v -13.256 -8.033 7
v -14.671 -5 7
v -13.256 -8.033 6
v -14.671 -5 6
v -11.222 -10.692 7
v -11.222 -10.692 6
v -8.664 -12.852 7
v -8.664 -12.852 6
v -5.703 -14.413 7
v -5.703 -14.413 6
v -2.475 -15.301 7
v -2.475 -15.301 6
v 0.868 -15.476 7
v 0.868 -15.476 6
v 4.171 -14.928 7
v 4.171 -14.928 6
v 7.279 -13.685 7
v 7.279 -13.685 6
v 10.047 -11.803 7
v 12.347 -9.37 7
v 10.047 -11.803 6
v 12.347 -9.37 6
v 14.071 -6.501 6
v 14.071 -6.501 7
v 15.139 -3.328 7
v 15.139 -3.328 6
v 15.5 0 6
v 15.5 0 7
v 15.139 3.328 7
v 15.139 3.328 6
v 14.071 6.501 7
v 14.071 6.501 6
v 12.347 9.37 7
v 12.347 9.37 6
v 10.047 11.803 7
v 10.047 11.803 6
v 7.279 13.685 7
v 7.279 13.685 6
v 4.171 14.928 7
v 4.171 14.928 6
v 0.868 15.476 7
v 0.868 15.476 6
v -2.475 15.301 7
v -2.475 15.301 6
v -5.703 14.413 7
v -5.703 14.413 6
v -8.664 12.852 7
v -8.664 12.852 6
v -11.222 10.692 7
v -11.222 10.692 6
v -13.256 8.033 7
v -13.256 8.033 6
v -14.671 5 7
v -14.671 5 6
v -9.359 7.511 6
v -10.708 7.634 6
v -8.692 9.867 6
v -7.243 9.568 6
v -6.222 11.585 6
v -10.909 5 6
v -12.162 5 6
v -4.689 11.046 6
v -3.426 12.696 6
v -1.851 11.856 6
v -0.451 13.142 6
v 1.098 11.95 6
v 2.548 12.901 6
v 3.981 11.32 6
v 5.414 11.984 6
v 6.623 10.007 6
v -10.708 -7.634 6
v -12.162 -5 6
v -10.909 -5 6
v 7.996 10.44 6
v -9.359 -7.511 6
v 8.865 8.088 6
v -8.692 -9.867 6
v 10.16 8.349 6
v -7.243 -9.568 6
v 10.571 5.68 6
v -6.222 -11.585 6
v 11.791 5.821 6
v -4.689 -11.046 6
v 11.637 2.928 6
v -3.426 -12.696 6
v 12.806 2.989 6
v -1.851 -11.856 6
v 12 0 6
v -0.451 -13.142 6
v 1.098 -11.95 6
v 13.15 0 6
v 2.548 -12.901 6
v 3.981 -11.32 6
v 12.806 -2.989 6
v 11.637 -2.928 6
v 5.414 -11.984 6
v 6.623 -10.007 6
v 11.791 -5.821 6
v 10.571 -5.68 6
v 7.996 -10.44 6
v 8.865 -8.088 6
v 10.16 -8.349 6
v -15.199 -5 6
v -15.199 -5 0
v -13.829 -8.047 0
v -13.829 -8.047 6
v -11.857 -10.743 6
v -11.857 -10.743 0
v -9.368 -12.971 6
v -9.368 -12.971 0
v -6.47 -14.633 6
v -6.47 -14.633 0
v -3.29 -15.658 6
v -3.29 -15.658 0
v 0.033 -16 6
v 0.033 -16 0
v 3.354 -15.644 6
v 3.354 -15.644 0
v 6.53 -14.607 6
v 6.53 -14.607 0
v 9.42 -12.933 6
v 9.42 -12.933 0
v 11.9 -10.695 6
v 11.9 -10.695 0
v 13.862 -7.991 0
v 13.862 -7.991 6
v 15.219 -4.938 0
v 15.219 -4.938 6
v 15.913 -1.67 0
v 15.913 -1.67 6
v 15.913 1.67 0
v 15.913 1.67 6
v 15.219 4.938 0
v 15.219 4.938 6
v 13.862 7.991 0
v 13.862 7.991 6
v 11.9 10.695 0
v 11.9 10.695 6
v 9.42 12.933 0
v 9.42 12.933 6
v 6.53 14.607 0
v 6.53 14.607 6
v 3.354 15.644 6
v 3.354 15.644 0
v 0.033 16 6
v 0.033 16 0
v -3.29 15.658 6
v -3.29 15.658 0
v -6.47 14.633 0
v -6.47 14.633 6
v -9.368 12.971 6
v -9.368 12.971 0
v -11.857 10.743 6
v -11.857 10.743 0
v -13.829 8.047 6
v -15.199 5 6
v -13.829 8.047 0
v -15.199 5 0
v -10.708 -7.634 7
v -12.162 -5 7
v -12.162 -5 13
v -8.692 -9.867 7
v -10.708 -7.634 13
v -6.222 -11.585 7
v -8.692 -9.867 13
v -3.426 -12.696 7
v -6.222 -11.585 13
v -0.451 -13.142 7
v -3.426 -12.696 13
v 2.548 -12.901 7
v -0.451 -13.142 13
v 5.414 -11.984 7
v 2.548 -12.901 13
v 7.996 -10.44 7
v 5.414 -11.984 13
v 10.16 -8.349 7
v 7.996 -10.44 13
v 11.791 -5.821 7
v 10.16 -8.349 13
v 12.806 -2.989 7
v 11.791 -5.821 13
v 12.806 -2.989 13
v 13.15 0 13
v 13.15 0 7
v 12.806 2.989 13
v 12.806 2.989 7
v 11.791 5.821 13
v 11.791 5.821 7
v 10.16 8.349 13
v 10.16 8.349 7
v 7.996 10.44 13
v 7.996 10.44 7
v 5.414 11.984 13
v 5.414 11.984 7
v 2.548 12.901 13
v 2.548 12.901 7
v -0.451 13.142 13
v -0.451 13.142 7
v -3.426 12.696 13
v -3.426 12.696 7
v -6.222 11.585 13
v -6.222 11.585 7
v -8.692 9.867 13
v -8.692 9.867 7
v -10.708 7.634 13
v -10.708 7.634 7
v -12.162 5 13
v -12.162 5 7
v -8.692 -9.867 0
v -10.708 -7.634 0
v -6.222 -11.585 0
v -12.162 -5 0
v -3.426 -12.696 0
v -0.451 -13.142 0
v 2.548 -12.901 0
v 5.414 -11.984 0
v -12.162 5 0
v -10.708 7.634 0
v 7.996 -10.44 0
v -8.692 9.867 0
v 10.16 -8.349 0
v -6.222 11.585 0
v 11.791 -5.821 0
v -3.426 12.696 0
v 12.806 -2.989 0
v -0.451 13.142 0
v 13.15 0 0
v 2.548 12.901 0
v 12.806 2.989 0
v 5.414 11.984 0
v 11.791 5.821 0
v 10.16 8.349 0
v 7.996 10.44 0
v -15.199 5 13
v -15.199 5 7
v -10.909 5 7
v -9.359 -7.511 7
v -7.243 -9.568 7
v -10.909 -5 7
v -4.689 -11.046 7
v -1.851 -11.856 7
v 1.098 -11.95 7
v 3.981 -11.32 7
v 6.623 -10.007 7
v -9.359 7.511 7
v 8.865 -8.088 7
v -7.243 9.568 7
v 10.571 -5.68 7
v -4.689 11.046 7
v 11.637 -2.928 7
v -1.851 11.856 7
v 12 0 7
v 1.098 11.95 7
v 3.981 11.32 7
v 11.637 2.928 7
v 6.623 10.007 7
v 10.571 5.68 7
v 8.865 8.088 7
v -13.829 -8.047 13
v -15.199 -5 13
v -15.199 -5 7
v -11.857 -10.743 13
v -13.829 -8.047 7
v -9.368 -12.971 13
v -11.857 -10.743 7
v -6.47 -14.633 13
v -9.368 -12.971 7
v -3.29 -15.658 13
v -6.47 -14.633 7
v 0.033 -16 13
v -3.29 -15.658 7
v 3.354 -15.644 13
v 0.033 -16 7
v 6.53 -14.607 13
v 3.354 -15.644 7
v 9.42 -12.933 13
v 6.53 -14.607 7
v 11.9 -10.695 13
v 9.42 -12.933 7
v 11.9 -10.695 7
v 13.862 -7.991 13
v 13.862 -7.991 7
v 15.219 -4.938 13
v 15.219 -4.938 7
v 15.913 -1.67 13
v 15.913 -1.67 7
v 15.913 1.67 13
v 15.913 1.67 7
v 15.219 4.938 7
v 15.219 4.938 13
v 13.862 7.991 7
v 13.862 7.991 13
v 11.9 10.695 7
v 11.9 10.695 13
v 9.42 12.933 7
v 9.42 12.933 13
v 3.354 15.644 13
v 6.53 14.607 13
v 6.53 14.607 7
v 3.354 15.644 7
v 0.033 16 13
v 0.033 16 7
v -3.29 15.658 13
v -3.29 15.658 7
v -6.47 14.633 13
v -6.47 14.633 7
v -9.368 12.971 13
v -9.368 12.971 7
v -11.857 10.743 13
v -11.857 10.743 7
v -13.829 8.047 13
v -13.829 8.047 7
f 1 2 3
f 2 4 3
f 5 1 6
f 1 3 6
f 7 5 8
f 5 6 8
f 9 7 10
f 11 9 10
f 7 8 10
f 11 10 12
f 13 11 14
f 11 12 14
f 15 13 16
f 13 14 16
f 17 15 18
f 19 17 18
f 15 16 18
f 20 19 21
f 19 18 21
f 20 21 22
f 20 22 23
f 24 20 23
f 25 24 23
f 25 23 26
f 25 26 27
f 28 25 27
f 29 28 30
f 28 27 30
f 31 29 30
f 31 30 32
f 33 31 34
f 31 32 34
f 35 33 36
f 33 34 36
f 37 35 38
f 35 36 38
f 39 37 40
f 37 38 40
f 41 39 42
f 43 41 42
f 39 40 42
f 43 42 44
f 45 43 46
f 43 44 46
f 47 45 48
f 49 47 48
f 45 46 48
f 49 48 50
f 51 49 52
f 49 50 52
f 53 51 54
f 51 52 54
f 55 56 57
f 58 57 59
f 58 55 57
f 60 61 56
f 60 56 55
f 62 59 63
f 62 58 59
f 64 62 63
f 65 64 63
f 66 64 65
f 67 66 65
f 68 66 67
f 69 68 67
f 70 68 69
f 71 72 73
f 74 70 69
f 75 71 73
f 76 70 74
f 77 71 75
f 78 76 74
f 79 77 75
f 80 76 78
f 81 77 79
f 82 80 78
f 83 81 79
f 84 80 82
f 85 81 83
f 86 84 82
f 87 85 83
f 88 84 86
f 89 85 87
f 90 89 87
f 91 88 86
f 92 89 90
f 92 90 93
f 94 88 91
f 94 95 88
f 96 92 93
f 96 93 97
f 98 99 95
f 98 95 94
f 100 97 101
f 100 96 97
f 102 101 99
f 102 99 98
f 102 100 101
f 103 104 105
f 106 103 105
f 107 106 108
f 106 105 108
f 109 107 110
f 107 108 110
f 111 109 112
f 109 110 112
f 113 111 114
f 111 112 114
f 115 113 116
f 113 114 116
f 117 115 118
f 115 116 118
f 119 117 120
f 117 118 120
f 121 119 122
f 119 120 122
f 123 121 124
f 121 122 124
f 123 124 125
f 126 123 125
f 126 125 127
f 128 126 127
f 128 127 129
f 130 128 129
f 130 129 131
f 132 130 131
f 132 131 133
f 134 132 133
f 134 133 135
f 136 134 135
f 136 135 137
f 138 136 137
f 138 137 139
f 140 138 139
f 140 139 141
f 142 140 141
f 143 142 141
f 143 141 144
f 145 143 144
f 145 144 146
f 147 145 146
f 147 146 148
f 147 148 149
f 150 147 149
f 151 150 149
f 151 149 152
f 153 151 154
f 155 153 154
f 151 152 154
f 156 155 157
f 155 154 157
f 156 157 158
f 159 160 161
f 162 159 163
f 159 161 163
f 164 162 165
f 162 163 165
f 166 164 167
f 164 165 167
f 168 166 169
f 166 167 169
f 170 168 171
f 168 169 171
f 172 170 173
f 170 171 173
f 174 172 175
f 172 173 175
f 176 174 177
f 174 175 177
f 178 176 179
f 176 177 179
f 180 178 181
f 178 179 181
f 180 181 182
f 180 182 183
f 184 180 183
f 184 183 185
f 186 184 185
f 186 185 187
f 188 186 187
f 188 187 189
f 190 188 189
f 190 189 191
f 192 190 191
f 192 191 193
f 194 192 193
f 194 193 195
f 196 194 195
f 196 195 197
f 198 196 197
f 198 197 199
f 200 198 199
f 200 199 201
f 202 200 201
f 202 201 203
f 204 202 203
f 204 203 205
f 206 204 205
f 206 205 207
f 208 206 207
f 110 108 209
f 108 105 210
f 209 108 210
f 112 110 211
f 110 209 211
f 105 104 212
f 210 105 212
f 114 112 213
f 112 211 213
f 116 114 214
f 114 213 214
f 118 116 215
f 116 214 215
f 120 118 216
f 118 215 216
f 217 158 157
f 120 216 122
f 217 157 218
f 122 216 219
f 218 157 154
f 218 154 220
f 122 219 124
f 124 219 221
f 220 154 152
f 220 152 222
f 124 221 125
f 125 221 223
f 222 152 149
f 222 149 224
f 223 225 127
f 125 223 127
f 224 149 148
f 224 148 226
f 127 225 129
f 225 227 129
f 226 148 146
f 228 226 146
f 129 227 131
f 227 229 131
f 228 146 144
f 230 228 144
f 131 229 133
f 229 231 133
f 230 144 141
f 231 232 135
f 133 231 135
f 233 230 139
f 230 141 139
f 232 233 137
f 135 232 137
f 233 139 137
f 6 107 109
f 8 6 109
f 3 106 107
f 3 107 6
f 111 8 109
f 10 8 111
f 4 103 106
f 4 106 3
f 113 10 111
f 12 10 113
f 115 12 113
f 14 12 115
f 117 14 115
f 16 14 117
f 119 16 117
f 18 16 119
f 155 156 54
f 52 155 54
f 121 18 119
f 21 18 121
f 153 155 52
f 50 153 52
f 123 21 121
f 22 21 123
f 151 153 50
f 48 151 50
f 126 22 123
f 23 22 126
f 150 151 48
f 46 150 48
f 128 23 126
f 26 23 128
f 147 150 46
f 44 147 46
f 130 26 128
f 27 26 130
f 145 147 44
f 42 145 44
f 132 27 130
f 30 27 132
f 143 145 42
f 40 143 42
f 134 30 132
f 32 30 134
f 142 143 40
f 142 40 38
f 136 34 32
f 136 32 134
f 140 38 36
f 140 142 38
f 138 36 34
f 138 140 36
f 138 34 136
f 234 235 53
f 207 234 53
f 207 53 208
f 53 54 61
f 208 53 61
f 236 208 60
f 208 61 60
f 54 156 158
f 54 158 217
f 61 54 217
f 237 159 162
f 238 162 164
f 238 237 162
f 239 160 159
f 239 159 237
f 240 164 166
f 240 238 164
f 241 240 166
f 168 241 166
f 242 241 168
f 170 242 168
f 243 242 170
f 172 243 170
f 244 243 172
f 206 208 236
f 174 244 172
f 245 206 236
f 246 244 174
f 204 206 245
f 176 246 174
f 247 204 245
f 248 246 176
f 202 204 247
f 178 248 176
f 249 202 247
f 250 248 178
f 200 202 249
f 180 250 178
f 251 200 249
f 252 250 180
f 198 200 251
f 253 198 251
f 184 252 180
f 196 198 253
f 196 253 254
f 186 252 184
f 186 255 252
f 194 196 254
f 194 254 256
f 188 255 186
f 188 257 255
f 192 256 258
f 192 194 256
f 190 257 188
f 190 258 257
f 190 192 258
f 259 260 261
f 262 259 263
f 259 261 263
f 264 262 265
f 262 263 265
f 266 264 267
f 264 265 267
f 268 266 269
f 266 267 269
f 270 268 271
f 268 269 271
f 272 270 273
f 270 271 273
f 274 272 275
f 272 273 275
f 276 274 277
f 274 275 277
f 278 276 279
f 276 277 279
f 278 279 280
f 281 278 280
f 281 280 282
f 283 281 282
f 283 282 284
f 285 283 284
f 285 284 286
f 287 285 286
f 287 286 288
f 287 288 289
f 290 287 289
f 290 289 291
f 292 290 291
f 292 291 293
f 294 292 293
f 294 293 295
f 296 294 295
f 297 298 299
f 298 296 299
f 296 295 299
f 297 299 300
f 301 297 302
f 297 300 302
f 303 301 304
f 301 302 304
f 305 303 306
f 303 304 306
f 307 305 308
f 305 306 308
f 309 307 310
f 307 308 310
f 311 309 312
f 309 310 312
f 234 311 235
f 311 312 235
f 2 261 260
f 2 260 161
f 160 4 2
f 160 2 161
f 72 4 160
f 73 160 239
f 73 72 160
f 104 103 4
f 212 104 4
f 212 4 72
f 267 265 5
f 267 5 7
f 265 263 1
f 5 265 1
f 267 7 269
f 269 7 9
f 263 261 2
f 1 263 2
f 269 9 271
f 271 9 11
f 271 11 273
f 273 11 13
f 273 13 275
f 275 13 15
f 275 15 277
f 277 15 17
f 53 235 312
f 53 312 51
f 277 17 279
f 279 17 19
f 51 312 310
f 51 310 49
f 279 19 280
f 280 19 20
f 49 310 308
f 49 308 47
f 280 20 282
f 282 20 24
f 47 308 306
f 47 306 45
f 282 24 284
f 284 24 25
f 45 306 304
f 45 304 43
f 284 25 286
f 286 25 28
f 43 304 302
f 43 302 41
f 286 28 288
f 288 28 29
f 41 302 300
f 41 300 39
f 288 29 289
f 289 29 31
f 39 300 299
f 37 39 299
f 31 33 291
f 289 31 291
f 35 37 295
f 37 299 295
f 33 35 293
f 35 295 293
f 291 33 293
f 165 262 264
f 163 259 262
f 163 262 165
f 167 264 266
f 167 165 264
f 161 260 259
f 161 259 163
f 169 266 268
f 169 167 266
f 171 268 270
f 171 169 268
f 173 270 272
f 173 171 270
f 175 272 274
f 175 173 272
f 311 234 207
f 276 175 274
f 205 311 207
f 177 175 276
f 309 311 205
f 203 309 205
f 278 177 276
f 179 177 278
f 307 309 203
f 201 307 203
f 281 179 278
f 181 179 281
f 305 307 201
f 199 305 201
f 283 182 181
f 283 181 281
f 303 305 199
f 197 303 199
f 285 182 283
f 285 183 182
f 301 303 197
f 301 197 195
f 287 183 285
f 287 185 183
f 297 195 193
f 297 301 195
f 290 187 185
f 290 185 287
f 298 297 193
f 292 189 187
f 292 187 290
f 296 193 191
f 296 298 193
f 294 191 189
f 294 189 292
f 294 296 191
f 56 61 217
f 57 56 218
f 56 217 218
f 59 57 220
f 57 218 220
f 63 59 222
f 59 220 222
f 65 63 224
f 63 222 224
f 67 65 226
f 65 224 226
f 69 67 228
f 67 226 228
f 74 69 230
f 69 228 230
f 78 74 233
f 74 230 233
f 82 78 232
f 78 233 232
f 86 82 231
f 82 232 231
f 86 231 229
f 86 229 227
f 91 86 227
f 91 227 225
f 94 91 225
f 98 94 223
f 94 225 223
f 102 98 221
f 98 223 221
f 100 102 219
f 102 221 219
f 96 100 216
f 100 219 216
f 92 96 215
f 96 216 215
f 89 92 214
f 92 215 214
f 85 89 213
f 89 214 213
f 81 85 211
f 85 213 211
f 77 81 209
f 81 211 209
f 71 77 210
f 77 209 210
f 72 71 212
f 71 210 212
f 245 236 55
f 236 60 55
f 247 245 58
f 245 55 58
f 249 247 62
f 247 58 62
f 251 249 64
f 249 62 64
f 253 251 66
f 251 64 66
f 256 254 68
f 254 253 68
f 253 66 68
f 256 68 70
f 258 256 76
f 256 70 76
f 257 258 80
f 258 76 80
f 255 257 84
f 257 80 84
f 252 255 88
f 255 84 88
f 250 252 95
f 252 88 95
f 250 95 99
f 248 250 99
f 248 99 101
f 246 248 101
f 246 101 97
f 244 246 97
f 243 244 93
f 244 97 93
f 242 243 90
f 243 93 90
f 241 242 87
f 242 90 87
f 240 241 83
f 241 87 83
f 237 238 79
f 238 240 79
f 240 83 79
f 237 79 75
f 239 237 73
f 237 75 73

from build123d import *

# Parameters (mm, degrees)
SKETCH_R        = 16
PAD_DEPTH       = 6
SKETCH001_R     = 15.5
PAD001_DEPTH    = 1
SKETCH002_R     = 16
PAD002_DEPTH    = 6
SKETCH003_R     = 13.15
POCKET_DEPTH    = 6
SKETCH004_R     = 13.15
POCKET001_DEPTH = 6
SKETCH005_R     = 12
POCKET002_DEPTH = 1
SKETCH006_W     = 6
SKETCH006_H     = 10
POCKET003_DEPTH = 13


with BuildPart() as part:
    # Sketch → Pad (new body)
    with BuildSketch(Plane.XY):
        Circle(SKETCH_R)
    extrude(amount=PAD_DEPTH)

    # Sketch001 (on Face3 of Pad) → Pad001 (join)
    with BuildSketch(Plane.XY.offset(6)):
        Circle(SKETCH001_R)
    extrude(amount=PAD001_DEPTH)

    # Sketch002 (on Face5 of Pad001) → Pad002 (join)
    with BuildSketch(Plane.XY.offset(7)):
        Circle(SKETCH002_R)
    extrude(amount=PAD002_DEPTH)

    # Sketch003 (on Face3 of Pad002) → Pocket (cut)
    with BuildSketch(Plane.XY.offset(13)):
        Circle(SKETCH003_R)
    extrude(amount=-POCKET_DEPTH, mode=Mode.SUBTRACT)

    # Sketch004 (on Face9 of Pocket) → Pocket001 (cut)
    with BuildSketch(Plane(origin=(0, 0, 0), x_dir=(1, 0, 0), z_dir=(0, 0, -1))):
        Circle(SKETCH004_R)
    extrude(amount=-POCKET001_DEPTH, mode=Mode.SUBTRACT)

    # Sketch005 (on Face11 of Pocket001) → Pocket002 (cut)
    with BuildSketch(Plane(origin=(0, 0, 6), x_dir=(1, 0, 0), z_dir=(0, 0, -1))):
        Circle(SKETCH005_R)
    extrude(amount=-POCKET002_DEPTH, mode=Mode.SUBTRACT)

    # Sketch006 (on Face10 of Pocket002) → Pocket003 (cut)
    with BuildSketch(Plane(origin=(0, 0, 0), x_dir=(1, 0, 0), z_dir=(0, 0, -1))):
        with Locations((-13, 0)):
            Rectangle(SKETCH006_W, SKETCH006_H)
    extrude(amount=-POCKET003_DEPTH, mode=Mode.SUBTRACT)


solid = part.part
